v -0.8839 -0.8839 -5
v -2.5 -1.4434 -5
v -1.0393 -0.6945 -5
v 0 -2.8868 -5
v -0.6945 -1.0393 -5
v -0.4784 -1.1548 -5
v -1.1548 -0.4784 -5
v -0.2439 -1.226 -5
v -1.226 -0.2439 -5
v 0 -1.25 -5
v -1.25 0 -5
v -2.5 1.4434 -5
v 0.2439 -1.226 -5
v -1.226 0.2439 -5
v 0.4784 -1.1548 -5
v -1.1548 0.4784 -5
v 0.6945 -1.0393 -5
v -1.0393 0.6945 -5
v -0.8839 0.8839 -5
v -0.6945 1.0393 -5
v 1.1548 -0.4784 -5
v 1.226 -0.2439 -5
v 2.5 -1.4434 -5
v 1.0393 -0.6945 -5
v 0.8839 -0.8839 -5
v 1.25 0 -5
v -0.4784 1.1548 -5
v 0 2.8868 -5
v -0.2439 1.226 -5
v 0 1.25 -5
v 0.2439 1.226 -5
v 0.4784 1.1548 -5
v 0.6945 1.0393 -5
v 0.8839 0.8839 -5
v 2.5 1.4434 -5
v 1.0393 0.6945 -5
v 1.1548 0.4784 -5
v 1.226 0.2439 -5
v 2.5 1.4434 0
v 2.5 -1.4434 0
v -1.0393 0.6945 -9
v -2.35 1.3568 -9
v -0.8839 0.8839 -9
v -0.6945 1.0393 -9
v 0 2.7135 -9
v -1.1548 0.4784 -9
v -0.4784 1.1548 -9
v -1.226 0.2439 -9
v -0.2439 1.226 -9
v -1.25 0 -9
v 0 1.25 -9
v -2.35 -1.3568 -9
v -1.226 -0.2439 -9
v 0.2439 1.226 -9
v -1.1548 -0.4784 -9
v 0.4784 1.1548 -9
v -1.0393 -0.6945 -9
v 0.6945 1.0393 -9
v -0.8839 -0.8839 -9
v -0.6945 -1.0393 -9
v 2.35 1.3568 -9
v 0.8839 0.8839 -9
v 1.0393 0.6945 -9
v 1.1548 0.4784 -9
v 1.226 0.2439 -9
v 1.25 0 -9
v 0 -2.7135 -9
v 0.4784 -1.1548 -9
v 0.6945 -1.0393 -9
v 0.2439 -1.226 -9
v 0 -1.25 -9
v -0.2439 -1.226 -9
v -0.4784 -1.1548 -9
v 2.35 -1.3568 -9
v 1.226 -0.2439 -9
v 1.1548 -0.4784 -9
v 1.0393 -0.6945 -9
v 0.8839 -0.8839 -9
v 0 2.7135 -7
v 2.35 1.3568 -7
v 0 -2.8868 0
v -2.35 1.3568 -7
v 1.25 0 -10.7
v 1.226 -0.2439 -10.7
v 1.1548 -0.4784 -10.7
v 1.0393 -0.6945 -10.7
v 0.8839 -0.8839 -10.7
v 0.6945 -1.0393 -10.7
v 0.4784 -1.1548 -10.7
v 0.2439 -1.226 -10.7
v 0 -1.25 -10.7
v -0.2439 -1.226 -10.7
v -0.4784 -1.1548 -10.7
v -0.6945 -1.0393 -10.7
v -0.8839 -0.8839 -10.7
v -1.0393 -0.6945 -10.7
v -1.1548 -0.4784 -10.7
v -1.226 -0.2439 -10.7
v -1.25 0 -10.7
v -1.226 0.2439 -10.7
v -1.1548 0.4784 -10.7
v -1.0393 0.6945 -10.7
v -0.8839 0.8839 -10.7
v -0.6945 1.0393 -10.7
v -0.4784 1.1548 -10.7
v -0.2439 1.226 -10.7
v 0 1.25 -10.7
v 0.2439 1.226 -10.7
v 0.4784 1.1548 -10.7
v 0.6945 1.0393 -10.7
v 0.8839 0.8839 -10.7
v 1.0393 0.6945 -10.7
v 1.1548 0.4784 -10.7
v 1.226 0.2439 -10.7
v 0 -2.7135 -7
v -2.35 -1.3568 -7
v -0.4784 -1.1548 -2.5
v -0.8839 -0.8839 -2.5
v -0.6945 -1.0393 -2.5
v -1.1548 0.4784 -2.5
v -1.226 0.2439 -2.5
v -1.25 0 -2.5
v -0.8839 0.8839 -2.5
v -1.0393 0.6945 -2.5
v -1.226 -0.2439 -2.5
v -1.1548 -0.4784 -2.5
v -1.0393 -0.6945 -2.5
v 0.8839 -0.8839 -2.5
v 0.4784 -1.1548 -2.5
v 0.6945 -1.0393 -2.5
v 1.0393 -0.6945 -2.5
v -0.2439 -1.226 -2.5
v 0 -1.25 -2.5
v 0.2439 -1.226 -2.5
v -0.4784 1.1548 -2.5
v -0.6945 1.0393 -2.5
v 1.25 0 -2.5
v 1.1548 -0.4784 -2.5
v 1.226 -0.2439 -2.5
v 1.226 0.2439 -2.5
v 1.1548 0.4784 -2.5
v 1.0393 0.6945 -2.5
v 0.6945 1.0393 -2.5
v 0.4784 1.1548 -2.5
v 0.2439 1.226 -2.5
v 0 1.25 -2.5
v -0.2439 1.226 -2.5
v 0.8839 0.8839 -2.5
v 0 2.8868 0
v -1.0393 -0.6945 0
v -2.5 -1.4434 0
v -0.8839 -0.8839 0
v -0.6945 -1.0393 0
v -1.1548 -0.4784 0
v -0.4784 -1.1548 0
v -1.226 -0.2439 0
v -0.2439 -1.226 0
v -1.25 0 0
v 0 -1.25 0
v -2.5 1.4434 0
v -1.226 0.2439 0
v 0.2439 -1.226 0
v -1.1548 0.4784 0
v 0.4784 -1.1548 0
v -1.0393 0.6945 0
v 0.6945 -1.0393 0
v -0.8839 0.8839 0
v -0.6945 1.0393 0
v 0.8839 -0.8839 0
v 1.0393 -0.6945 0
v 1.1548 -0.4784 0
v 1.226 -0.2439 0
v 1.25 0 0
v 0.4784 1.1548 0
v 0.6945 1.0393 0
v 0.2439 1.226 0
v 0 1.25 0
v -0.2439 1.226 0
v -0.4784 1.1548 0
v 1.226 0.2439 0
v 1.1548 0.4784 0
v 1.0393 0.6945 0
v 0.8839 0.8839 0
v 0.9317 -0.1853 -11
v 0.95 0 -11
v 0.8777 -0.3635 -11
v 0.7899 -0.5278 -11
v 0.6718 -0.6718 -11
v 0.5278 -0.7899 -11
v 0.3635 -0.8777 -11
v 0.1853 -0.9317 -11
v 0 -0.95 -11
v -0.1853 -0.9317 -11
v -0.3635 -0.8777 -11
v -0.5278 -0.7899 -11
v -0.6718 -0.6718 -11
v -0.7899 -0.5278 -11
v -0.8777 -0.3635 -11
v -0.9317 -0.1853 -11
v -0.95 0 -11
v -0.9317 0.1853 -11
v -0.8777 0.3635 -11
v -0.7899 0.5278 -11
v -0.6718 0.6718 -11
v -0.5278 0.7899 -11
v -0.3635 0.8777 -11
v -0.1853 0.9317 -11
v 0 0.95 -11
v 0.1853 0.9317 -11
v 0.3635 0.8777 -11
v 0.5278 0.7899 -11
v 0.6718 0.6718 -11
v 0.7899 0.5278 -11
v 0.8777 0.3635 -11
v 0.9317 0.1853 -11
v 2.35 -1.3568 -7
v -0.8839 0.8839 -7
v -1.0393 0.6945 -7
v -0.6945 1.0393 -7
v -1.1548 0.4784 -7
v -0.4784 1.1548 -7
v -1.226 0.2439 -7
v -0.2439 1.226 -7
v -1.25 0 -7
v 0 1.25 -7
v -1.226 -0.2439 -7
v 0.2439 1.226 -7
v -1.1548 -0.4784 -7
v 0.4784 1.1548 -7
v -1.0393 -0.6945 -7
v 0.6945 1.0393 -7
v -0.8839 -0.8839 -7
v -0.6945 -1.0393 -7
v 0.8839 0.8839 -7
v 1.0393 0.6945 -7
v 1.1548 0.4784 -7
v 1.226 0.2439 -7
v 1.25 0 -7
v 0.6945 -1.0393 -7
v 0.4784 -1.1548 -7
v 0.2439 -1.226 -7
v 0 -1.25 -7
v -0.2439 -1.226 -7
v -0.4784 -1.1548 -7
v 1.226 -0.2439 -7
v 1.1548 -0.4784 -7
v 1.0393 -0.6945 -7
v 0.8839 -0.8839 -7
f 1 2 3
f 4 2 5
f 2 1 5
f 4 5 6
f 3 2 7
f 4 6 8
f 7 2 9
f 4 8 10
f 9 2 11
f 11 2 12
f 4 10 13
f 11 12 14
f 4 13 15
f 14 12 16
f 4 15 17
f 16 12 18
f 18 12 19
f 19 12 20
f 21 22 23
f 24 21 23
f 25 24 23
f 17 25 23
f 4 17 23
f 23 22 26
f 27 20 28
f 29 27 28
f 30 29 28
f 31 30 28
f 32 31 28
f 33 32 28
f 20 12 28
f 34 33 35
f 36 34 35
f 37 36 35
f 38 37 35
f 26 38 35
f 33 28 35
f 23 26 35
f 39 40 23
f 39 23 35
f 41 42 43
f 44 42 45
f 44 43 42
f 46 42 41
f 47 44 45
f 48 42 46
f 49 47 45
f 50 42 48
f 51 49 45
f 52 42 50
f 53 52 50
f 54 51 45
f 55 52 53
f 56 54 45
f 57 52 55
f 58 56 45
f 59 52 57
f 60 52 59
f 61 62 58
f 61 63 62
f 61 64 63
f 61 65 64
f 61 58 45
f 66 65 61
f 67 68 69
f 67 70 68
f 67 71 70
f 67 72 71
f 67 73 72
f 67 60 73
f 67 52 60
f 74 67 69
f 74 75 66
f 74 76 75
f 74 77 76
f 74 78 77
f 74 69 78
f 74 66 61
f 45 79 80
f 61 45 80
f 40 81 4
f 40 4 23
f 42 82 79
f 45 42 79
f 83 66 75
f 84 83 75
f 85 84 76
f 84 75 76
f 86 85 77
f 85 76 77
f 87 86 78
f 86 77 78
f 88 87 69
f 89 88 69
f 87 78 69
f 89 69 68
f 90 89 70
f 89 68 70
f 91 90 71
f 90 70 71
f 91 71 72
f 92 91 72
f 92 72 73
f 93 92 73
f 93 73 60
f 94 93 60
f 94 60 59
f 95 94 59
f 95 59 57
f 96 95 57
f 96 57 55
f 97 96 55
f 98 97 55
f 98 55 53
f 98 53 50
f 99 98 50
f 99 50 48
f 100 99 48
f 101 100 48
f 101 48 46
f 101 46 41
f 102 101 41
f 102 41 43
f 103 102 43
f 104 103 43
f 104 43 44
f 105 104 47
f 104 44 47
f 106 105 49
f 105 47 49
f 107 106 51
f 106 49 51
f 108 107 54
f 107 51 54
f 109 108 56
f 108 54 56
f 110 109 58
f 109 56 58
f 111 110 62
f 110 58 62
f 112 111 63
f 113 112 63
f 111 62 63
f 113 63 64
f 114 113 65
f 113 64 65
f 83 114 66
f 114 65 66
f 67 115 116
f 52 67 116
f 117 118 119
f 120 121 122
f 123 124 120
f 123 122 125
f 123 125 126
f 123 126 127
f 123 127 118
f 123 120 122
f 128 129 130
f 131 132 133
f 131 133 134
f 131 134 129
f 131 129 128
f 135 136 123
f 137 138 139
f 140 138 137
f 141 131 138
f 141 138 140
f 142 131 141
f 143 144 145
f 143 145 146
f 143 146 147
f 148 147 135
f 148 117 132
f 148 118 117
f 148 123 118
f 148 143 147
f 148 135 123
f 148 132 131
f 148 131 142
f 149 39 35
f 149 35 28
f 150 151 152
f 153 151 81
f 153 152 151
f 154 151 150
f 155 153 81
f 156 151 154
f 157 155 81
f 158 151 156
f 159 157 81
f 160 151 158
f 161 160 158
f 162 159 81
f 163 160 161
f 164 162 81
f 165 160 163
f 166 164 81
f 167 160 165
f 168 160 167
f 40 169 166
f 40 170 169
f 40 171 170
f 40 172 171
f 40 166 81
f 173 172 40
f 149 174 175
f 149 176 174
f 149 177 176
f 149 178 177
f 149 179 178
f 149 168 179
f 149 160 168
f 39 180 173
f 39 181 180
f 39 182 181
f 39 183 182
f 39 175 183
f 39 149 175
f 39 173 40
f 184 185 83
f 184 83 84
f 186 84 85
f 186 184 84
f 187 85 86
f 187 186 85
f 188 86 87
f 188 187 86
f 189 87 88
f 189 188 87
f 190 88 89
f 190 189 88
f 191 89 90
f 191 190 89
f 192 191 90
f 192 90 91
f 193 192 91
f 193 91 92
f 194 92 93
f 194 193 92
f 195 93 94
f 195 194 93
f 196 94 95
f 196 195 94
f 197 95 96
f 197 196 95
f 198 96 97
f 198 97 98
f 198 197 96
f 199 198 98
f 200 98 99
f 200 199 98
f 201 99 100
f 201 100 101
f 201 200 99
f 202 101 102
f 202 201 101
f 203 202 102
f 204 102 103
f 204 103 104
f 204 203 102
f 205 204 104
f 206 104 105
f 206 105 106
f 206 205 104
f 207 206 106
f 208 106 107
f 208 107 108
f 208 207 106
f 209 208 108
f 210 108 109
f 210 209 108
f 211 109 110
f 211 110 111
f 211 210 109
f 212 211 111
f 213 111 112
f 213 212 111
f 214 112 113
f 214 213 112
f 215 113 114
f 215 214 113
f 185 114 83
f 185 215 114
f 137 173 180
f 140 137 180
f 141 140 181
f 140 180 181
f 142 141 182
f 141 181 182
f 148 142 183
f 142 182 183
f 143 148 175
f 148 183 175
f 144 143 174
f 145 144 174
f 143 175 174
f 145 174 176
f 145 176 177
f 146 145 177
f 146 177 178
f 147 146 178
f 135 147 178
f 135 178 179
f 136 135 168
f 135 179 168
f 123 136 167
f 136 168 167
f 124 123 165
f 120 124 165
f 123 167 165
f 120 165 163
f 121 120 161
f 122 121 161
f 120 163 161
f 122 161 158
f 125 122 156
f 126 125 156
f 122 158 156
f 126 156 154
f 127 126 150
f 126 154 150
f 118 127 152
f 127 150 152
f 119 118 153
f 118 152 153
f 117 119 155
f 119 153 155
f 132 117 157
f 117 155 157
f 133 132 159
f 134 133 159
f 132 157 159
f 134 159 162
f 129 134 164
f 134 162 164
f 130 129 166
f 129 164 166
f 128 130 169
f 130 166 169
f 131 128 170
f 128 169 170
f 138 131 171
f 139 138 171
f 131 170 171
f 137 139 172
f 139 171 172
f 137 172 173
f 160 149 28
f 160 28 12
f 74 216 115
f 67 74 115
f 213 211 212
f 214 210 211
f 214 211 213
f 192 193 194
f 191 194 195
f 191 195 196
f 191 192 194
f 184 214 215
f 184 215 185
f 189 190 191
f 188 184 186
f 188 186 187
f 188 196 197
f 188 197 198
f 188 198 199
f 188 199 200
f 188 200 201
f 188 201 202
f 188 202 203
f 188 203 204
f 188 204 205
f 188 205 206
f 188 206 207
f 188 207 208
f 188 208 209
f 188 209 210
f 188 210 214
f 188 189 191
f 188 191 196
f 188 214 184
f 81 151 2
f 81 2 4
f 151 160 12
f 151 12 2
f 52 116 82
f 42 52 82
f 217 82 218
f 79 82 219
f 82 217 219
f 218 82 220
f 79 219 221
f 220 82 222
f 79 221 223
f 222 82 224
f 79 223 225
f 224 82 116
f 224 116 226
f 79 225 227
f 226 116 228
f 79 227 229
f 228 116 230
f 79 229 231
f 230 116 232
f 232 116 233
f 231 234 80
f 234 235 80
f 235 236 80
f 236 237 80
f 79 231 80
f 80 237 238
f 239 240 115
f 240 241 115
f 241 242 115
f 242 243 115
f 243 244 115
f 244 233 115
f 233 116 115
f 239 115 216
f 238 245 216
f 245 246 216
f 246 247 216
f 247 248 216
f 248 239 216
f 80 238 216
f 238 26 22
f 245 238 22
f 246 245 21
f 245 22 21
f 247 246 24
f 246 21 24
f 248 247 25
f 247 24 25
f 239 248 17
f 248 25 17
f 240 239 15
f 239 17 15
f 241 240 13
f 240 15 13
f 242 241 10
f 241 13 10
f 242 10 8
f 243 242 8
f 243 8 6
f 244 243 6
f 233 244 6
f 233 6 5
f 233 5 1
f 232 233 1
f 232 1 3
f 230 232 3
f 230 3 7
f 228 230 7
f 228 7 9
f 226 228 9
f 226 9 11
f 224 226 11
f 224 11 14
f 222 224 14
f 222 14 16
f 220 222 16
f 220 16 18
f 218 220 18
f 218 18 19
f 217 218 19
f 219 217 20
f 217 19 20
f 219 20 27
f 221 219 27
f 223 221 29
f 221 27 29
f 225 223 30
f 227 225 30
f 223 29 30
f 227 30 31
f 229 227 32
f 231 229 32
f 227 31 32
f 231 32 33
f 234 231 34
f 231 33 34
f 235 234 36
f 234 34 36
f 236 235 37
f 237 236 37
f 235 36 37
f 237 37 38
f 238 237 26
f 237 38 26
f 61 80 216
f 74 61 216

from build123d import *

# Parameters (mm, degrees)
F1_DEPTH = 5
F2_R     = 1.25
F3_DEPTH = 6
F4_R     = 1.25
F5_DEPTH = 2.5
F6_SIZE  = 0.3
F8_R     = 1.25
F9_DEPTH = 2


with BuildPart() as f1:
    # F0 (on Top) → F1 (new body)
    with BuildSketch(Plane.XY):
        Polygon((2.5, 1.443376), (0, 2.886751), (-2.5, 1.443376), (-2.5, -1.443376), (0, -2.886751), (2.5, -1.443376), align=None)
    extrude(amount=-F1_DEPTH)

    # F2 (on face) → F3 (join)
    with BuildSketch(Plane(origin=(0, 0, -5), x_dir=(1, 0, 0), z_dir=(0, 0, -1))):
        Circle(F2_R)
    extrude(amount=F3_DEPTH)

    # F4 (on face) → F5 (cut)
    with BuildSketch(Plane.XY):
        Circle(F4_R)
    extrude(amount=-F5_DEPTH, mode=Mode.SUBTRACT)

    # F6
    f6_edges = [f1.edges().sort_by_distance(p)[0] for p in [
        (-1.25, 0, -11),
    ]]
    chamfer(f6_edges, length=F6_SIZE)

    # F8 (on offset) → F9 (join)
    with BuildSketch(Plane(origin=(0, 0, -7), x_dir=(1, 0, 0), z_dir=(0, 0, -1))):
        Polygon((0, 2.713546), (-2.35, 1.356773), (-2.35, -1.356773), (0, -2.713546), (2.35, -1.356773), (2.35, 1.356773), align=None)
        Circle(F8_R, mode=Mode.SUBTRACT)
    extrude(amount=F9_DEPTH)


solid = f1.part
